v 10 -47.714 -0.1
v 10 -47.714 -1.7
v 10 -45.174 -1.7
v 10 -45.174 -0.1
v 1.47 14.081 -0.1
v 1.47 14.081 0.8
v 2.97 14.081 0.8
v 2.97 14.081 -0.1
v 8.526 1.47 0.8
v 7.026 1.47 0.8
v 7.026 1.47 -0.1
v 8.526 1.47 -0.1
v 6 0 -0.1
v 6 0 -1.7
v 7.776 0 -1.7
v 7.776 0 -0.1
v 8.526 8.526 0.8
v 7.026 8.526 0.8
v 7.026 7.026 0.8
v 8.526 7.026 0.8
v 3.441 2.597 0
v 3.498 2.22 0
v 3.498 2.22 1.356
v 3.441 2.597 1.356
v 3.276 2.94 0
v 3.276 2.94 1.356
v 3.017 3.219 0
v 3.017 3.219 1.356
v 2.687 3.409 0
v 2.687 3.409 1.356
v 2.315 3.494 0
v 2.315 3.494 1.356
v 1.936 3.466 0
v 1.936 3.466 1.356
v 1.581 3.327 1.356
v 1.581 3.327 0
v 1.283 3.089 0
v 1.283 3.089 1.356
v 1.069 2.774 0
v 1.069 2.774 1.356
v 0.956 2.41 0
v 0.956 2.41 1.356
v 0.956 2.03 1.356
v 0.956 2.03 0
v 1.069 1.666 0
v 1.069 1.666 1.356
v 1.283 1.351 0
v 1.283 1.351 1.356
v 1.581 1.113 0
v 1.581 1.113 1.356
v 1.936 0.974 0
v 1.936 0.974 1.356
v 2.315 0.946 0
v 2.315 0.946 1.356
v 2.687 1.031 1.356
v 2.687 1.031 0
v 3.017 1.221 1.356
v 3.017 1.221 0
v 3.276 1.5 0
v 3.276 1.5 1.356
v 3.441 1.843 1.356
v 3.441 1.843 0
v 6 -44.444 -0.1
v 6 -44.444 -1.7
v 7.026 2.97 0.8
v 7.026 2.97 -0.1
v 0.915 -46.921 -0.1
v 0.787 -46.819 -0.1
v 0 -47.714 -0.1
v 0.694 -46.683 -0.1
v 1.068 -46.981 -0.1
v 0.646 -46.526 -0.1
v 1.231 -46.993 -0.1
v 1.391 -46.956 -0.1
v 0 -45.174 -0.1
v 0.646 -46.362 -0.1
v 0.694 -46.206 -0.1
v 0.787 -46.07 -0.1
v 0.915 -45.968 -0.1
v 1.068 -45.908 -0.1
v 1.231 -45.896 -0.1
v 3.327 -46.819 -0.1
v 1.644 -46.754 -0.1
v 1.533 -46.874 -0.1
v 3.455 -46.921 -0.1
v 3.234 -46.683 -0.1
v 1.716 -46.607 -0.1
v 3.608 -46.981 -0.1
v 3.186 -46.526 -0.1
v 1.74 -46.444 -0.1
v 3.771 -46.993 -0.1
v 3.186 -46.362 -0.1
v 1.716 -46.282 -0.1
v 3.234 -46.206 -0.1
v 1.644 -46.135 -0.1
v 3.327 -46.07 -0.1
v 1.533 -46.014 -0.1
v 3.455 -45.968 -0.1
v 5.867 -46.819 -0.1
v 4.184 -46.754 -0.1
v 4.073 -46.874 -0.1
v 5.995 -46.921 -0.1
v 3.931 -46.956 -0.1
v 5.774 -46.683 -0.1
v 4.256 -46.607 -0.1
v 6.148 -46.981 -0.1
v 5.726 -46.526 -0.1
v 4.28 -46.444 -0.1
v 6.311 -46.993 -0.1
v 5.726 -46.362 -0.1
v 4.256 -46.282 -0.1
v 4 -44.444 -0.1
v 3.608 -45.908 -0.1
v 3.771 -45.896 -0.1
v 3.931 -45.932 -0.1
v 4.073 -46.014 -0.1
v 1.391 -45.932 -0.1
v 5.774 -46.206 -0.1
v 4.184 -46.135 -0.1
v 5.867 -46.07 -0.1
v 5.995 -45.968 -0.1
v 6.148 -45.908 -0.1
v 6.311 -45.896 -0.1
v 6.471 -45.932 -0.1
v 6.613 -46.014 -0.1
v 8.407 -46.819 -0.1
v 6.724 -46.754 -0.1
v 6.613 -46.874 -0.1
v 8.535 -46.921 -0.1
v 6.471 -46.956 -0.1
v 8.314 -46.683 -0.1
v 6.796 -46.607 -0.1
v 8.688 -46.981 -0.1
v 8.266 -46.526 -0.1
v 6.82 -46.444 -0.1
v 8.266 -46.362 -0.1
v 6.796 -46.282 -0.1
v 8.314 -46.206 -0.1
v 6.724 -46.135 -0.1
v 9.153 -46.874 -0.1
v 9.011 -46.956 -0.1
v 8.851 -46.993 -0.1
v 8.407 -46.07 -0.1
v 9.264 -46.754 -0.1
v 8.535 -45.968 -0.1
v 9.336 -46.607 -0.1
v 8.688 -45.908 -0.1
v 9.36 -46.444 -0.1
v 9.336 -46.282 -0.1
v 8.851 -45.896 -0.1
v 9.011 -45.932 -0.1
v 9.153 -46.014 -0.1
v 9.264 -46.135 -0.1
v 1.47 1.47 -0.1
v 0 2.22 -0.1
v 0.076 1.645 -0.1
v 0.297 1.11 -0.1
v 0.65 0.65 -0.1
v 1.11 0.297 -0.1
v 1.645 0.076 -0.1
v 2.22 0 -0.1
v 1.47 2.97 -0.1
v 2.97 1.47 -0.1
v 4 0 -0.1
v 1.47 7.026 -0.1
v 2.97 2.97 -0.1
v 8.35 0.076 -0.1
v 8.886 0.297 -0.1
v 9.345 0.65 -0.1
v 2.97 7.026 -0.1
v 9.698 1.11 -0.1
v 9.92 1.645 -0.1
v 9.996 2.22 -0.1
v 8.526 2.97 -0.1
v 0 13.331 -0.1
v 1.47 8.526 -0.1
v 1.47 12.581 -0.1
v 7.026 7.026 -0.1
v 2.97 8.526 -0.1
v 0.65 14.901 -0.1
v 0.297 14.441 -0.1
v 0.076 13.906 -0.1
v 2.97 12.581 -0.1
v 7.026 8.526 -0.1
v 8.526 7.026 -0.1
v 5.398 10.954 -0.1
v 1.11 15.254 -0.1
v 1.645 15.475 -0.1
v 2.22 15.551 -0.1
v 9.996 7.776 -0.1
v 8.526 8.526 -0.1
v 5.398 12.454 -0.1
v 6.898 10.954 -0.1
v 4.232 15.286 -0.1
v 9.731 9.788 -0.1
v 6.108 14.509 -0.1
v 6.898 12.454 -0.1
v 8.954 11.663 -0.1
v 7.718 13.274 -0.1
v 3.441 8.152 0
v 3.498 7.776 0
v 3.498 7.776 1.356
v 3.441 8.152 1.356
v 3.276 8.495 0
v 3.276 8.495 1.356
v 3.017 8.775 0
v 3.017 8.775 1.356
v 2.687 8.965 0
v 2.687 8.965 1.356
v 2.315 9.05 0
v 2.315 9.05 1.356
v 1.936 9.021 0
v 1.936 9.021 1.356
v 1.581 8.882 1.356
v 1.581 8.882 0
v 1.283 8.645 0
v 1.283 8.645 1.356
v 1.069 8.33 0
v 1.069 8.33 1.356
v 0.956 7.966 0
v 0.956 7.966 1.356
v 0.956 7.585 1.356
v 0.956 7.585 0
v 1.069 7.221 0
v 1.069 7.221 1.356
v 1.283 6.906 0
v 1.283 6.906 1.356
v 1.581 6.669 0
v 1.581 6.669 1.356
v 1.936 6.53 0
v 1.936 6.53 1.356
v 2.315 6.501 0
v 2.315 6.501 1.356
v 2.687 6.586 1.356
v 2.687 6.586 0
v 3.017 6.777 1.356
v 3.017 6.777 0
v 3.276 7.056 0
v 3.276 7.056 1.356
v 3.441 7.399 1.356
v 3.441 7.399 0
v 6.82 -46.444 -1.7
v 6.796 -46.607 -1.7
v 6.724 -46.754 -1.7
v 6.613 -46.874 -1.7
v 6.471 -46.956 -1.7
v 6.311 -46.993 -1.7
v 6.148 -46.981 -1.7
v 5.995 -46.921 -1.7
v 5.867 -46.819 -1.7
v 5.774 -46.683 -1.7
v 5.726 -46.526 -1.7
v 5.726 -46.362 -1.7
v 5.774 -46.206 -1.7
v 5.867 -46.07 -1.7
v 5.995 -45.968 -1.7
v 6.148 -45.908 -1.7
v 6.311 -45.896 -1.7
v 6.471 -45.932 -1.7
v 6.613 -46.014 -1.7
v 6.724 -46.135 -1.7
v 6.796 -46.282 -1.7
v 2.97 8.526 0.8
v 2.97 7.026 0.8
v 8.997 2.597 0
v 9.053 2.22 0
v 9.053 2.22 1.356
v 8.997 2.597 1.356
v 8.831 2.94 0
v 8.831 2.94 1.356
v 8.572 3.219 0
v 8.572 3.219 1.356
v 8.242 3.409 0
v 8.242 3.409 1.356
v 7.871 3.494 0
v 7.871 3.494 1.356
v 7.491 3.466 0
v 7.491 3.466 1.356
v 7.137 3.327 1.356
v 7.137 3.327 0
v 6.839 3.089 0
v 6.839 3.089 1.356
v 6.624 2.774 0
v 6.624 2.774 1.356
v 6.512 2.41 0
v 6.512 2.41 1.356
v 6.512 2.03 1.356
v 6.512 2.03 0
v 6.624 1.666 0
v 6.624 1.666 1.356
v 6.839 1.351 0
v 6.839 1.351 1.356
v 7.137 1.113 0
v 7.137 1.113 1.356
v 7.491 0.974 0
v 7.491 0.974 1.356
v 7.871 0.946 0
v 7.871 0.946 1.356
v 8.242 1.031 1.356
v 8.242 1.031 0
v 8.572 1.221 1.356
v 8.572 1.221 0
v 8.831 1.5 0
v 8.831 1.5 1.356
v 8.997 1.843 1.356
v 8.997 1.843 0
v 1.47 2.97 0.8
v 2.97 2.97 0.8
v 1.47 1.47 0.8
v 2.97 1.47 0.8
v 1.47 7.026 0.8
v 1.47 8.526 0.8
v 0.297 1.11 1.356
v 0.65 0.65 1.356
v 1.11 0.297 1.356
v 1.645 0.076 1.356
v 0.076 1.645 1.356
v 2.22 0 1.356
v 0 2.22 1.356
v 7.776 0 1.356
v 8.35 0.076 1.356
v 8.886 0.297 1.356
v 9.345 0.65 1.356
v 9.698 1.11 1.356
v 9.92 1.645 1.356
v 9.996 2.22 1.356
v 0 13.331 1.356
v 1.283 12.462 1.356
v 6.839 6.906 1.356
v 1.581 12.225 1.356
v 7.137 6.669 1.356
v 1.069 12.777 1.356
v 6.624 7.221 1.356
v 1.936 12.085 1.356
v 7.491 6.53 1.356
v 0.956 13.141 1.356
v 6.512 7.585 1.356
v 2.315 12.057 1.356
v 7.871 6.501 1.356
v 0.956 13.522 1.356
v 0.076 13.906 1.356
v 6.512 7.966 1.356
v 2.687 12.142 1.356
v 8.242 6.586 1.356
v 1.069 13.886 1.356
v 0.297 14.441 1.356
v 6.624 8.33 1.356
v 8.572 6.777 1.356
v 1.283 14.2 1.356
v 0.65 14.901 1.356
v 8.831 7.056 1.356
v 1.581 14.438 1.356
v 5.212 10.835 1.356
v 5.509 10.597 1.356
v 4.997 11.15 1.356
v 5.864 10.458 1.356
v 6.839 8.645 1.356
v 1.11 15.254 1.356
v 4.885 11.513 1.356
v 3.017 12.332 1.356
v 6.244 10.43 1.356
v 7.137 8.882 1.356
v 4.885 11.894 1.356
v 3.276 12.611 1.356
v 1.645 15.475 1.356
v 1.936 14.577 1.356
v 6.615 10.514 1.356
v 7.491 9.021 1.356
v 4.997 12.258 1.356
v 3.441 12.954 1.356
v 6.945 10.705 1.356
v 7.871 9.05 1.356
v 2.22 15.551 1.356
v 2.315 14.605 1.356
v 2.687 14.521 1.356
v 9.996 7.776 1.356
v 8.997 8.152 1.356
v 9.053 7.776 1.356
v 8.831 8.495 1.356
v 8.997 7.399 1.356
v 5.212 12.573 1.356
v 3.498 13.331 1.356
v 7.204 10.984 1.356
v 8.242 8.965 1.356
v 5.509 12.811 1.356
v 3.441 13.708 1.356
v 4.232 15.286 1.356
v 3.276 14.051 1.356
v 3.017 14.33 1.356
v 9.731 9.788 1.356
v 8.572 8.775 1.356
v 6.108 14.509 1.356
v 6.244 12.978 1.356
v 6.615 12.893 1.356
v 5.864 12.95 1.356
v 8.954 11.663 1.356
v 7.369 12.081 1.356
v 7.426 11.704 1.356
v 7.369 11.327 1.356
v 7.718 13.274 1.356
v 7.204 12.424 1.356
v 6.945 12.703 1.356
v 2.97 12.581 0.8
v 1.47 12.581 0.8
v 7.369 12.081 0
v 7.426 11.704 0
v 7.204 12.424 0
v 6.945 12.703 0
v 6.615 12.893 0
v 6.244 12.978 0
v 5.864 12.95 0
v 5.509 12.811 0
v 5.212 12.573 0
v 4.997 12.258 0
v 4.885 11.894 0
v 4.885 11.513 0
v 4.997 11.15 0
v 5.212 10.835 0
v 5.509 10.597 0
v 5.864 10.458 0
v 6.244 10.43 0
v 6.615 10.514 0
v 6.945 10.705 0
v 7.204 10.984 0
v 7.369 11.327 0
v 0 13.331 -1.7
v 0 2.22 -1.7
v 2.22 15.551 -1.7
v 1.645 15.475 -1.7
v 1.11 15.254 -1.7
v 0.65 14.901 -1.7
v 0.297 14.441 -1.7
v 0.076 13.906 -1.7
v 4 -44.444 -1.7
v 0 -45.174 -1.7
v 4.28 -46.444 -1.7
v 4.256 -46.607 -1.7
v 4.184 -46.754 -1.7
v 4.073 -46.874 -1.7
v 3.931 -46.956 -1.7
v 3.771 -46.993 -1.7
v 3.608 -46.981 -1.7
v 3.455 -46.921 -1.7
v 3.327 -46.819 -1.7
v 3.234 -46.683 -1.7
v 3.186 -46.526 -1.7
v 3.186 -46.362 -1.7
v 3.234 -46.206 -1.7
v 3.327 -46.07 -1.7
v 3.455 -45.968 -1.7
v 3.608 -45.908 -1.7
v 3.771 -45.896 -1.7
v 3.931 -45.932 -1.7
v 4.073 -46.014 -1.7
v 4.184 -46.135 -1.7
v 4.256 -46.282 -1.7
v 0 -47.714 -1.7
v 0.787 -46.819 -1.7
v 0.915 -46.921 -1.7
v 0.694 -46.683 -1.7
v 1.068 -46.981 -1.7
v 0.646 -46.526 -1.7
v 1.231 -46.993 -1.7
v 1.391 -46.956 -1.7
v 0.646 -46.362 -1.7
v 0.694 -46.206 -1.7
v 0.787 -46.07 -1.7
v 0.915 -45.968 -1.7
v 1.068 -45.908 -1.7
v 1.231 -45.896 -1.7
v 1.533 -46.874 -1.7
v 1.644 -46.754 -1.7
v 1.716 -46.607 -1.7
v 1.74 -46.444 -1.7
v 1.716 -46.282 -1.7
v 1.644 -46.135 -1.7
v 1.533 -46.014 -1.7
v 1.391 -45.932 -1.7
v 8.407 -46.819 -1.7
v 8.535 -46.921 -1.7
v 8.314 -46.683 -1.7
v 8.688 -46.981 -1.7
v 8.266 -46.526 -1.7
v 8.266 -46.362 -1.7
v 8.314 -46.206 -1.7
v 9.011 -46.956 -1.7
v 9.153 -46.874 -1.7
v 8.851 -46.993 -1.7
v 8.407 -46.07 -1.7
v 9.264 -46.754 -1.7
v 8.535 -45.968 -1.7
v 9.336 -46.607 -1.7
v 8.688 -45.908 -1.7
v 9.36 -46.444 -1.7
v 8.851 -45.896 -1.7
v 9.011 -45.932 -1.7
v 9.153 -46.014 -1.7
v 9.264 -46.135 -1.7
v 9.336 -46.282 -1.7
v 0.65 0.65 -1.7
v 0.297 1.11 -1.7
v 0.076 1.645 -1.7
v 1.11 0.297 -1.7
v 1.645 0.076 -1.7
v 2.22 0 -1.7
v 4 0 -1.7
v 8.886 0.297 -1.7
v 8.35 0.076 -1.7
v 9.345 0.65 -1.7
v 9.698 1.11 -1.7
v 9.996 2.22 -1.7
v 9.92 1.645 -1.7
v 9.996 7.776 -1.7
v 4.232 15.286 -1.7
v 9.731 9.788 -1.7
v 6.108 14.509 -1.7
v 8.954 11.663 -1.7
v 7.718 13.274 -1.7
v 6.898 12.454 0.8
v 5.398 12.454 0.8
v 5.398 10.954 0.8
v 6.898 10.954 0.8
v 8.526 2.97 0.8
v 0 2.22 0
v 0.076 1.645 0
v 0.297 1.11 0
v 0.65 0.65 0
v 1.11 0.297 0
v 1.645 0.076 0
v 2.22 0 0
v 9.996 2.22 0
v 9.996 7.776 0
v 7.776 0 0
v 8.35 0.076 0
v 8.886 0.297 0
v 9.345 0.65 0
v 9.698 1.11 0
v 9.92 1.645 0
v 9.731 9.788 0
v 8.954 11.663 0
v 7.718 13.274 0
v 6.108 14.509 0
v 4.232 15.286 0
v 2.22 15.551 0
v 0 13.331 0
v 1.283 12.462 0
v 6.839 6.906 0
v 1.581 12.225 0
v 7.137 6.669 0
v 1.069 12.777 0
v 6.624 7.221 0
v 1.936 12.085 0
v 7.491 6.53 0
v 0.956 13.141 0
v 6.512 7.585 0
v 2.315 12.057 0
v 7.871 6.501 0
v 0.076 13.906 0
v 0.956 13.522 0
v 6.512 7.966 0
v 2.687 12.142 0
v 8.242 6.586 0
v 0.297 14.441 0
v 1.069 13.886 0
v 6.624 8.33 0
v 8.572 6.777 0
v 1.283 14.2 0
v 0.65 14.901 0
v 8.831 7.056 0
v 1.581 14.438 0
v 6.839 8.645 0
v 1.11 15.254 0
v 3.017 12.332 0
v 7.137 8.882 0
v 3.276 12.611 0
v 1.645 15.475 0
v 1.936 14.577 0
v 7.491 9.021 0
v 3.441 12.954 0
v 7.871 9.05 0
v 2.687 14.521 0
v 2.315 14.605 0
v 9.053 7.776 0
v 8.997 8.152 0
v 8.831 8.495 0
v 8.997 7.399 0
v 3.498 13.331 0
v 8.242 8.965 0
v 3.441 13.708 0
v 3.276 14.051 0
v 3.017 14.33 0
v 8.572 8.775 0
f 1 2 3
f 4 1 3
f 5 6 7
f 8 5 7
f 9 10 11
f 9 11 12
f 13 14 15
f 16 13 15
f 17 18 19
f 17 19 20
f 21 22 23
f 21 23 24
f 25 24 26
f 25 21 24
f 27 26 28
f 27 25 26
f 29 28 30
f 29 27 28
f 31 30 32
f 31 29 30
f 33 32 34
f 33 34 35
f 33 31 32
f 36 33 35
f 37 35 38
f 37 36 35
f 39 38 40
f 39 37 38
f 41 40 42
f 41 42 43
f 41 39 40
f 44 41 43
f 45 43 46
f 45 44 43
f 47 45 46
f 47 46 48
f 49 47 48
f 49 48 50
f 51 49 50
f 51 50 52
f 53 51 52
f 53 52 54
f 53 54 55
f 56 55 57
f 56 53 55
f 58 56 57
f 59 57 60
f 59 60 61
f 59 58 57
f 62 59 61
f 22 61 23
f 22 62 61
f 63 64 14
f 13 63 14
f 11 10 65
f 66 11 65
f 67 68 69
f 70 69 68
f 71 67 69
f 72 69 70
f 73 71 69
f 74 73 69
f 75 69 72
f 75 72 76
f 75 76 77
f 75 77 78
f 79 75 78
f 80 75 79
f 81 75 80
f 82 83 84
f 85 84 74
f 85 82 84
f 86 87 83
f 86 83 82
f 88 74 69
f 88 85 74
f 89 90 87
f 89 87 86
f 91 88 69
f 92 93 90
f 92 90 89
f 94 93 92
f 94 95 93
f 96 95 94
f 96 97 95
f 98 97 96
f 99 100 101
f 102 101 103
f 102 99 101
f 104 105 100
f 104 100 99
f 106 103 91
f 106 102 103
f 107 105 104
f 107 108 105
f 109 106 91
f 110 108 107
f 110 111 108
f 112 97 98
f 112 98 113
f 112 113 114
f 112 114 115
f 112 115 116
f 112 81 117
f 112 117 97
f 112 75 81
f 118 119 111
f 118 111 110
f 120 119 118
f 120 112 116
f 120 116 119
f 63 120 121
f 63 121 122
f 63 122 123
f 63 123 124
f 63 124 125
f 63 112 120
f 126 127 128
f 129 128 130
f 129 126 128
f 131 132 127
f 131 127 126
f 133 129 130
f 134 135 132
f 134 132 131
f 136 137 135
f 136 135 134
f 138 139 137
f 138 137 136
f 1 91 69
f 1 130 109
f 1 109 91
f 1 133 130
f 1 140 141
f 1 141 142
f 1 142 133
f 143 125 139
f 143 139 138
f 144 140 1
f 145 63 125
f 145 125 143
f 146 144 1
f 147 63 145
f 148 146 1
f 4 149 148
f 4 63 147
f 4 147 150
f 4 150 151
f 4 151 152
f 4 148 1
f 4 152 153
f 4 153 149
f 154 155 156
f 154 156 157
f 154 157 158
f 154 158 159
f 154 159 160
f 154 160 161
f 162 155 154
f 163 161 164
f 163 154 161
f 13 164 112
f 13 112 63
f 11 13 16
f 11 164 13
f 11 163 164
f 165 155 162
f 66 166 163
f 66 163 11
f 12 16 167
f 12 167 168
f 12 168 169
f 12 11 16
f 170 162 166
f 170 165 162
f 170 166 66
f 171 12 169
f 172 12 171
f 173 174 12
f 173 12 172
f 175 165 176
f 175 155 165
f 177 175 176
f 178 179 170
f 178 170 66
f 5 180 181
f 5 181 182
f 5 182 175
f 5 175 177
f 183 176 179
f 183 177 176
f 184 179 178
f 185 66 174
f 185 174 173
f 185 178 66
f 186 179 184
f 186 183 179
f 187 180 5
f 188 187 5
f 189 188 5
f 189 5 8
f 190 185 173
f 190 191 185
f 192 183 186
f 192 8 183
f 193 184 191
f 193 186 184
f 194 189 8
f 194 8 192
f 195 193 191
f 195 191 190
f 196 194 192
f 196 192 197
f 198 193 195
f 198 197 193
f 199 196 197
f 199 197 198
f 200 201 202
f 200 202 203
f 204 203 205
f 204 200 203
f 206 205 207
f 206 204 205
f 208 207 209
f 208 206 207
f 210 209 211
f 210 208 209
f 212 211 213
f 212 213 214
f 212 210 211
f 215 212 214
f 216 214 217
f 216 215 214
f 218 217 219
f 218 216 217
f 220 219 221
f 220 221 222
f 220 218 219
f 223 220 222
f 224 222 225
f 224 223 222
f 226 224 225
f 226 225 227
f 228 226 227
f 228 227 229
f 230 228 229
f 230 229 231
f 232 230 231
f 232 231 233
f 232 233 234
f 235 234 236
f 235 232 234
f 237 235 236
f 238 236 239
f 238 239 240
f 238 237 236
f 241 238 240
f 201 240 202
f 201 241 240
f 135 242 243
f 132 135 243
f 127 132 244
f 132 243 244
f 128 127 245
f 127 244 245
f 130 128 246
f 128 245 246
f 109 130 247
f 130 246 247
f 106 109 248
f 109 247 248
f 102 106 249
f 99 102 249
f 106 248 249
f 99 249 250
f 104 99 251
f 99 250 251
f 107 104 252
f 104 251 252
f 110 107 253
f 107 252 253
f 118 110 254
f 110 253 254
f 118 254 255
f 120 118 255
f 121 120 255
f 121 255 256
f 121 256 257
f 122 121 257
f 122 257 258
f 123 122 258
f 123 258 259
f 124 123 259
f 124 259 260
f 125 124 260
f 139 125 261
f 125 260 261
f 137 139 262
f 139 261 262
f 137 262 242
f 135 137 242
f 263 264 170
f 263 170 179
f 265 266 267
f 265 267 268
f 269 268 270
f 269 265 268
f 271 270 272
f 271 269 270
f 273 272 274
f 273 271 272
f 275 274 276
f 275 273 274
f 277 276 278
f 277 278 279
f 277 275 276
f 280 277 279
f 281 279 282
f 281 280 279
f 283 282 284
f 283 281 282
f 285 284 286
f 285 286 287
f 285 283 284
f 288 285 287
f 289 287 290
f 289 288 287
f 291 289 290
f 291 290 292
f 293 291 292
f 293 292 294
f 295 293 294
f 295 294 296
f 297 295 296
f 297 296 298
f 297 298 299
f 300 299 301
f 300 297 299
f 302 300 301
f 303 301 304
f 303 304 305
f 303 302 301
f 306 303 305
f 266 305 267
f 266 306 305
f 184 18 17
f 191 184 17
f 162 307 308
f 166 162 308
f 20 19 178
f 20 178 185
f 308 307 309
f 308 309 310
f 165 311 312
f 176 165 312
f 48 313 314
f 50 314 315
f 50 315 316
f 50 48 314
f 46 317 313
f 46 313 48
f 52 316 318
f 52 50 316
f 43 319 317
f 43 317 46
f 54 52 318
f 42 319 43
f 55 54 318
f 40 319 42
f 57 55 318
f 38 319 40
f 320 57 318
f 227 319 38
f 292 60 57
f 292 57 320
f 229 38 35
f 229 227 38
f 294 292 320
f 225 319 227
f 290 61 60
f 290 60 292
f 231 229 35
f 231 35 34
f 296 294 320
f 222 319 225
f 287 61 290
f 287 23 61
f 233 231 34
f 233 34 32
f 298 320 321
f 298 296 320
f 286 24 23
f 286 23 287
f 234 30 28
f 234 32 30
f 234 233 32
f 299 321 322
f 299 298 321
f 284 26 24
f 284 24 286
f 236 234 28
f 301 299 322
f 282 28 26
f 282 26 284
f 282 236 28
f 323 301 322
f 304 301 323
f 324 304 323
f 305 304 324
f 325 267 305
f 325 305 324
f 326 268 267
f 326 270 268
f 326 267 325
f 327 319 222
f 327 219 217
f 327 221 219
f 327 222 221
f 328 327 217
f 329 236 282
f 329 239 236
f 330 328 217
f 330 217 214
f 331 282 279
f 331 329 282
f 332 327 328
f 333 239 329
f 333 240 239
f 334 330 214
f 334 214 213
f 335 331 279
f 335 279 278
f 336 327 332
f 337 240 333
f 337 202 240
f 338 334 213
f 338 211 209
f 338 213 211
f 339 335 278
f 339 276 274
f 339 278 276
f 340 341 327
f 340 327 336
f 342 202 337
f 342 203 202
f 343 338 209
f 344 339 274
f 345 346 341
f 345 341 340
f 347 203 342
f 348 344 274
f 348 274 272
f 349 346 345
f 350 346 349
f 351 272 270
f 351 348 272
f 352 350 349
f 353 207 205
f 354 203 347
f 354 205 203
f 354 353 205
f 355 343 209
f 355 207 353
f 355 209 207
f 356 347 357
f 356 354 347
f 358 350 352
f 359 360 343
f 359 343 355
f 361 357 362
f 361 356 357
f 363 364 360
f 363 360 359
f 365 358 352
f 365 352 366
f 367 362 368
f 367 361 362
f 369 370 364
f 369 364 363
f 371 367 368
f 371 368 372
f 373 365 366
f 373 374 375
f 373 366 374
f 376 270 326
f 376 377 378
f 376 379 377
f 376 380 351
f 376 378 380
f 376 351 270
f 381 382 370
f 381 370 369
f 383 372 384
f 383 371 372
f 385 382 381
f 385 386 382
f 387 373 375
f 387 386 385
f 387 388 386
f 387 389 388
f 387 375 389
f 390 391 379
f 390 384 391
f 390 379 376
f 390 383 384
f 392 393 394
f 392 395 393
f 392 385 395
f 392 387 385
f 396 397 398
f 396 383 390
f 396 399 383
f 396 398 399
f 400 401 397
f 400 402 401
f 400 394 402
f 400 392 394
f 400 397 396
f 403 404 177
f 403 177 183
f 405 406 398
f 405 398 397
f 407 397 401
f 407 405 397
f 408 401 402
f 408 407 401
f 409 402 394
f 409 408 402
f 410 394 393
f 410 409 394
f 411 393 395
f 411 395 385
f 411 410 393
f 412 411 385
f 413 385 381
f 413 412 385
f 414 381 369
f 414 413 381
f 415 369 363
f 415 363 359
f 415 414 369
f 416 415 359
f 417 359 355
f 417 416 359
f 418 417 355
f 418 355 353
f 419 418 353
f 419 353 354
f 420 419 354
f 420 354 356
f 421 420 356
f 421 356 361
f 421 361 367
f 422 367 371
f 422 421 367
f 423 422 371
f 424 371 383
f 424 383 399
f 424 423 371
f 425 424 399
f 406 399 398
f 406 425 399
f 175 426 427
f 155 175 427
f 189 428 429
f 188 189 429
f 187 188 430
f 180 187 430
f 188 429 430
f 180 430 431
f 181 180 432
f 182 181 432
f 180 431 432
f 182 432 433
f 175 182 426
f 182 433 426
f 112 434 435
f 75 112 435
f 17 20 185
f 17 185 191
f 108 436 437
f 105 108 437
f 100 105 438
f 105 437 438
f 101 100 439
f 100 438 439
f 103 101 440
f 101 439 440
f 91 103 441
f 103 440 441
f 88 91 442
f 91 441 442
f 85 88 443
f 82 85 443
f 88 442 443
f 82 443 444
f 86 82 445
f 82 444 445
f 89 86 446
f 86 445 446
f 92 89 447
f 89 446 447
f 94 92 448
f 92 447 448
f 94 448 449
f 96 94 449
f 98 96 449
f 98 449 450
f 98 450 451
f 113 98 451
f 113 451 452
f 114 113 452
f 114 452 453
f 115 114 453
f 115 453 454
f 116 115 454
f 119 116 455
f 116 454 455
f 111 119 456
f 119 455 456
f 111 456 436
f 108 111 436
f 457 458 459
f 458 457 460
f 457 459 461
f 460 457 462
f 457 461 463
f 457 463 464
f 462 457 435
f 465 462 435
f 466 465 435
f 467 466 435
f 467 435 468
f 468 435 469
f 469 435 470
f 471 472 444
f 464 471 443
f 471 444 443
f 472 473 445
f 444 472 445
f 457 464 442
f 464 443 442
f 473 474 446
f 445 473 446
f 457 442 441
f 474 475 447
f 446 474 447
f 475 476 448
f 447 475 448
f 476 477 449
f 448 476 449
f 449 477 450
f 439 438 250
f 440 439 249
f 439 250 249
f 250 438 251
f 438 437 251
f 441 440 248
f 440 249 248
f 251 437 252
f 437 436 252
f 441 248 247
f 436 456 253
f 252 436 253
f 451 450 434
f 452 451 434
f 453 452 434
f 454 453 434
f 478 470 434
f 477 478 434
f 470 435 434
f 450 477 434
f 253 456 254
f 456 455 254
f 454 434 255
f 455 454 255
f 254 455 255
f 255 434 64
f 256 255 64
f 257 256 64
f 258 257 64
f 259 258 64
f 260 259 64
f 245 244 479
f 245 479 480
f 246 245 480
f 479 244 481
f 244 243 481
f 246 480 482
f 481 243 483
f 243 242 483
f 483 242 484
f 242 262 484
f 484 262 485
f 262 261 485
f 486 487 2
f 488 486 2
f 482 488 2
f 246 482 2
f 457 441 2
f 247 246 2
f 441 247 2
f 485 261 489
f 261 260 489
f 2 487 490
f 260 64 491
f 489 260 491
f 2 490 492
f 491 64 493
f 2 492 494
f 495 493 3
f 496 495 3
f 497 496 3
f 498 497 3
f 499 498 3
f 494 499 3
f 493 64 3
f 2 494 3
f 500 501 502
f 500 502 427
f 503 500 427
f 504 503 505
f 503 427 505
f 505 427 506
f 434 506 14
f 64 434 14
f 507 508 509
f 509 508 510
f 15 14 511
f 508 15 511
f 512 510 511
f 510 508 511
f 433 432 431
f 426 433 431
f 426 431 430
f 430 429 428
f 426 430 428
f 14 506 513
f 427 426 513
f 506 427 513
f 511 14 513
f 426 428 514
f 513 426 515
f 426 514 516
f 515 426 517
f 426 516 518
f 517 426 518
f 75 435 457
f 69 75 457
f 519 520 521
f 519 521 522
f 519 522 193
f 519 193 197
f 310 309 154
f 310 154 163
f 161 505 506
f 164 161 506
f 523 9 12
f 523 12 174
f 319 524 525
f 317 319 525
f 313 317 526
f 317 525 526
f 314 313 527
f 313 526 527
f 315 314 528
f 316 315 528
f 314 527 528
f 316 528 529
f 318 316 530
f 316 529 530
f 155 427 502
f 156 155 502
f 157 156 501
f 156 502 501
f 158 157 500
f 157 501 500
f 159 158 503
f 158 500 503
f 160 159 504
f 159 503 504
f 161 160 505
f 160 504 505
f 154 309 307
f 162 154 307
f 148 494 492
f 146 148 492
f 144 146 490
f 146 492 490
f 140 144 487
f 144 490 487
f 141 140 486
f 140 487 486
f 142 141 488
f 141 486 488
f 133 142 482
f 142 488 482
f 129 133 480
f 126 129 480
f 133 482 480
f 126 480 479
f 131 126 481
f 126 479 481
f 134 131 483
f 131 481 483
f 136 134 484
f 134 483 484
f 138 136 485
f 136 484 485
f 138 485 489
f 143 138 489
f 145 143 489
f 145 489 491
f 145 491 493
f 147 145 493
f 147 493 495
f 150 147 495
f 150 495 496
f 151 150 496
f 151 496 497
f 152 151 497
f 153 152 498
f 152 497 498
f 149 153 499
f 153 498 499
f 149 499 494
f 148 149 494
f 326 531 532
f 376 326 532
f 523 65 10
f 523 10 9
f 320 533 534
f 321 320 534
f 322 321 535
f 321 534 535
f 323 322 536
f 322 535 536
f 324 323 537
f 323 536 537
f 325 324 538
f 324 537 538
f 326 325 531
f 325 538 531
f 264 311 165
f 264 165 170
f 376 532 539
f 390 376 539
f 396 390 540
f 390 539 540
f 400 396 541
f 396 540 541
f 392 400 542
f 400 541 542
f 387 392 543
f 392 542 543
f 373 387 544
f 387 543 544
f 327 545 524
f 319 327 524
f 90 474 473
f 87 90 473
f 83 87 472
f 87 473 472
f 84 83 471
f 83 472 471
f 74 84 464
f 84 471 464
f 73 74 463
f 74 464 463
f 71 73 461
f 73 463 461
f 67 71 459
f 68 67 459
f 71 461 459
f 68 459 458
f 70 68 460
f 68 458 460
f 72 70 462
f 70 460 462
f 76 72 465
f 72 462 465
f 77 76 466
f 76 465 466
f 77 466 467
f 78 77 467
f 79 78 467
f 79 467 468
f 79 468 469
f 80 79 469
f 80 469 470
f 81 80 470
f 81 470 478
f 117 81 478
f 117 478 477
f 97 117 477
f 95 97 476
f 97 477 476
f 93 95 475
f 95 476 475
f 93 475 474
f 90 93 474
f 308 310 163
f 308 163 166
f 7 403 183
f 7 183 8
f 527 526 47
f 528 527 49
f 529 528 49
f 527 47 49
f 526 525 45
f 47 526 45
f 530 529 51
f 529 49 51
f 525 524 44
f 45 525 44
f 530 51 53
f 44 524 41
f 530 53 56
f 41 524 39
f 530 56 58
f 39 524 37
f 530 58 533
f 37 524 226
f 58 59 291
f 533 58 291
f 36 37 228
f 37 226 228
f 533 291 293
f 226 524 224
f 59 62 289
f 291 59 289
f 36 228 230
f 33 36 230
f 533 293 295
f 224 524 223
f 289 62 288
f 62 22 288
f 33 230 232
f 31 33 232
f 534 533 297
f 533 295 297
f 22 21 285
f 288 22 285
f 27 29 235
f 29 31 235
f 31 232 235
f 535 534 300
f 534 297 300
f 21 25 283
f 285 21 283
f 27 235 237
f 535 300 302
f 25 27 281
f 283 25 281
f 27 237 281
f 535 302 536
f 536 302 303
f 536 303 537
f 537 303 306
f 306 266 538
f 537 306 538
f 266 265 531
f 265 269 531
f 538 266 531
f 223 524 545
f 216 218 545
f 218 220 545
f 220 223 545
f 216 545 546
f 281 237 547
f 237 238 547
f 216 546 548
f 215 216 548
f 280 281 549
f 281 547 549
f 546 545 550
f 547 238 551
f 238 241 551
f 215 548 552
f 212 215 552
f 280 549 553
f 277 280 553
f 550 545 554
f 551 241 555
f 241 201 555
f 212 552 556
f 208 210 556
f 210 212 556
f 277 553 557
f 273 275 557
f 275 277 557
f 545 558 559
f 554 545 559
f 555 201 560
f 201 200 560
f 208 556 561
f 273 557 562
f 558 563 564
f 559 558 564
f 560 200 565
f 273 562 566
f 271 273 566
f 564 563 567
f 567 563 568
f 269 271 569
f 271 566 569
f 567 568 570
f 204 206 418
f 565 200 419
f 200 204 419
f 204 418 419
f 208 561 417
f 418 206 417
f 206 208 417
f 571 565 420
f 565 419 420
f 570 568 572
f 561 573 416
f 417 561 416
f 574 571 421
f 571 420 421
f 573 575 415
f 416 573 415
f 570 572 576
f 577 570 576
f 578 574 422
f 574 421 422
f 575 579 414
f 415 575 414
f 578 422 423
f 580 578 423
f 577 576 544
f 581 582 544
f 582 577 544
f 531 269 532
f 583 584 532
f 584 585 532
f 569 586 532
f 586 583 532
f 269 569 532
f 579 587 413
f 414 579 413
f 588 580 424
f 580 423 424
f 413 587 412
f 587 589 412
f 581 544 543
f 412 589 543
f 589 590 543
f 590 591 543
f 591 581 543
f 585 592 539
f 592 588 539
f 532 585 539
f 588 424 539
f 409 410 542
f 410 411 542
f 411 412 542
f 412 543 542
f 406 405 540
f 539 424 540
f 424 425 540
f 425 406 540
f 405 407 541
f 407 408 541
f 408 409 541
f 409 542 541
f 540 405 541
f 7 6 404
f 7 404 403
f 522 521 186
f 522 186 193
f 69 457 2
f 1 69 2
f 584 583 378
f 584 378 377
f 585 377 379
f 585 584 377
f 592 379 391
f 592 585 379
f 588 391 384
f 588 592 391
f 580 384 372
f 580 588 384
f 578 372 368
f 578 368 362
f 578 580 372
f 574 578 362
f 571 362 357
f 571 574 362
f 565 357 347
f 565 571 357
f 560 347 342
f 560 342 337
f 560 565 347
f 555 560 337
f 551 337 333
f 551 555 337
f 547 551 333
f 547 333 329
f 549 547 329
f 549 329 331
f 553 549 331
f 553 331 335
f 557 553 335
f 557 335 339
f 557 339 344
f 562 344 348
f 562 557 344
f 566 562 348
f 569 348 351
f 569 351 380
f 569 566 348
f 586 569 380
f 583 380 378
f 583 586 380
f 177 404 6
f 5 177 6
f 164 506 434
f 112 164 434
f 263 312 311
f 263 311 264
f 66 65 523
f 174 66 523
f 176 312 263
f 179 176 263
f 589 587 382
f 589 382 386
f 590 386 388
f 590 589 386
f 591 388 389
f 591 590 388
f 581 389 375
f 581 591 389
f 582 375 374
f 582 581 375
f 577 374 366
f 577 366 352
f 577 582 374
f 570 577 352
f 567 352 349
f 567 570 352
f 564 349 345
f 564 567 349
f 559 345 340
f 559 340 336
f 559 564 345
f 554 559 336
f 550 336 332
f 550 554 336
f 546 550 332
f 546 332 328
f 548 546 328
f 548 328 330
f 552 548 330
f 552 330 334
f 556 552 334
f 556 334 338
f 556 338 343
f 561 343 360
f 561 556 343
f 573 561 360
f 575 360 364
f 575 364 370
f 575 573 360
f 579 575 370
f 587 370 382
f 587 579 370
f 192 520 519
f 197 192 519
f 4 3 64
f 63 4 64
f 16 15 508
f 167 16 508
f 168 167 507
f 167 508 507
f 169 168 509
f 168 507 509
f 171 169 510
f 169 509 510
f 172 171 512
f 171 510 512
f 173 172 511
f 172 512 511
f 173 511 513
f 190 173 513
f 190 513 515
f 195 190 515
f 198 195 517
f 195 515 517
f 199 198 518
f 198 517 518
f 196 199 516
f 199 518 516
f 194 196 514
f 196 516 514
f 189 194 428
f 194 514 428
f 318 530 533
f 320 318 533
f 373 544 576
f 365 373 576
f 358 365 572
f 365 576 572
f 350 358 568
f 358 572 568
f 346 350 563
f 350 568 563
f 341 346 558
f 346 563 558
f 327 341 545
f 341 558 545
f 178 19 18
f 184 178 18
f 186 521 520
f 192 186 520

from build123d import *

# Parameters (mm, degrees)
SKETCH_R          = 1.277778
PAD_DEPTH         = 1.355556
SKETCH001_W       = 1.5
SKETCH001_H       = 1.5
PAD001_DEPTH      = 0.8
PAD001_DEPTH_BACK = 1.6
PAD002_DEPTH      = 1.6
SKETCH003_R       = 0.55
PAD003_DEPTH      = 1.6


with BuildPart() as part:
    # Sketch (on XY_Plane of Origin) → Pad (new body)
    with BuildSketch(Plane.XY):
        with BuildLine():
            ThreePointArc((2.22, 15.551111), (0.650223, 14.900888), (0, 13.331111))
            Line((0, 13.331111), (0, 2.219999))
            ThreePointArc((0, 2.219999), (0.650223, 0.650223), (2.22, 0))
            Line((2.22, 0), (7.775544, 0))
            ThreePointArc((7.775544, 0), (9.345329, 0.650219), (9.995556, 2.22))
            Line((9.995556, 2.22), (9.995556, 7.775556))
            ThreePointArc((9.995556, 7.775556), (7.718148, 13.273704), (2.22, 15.551111))
        make_face()
        with Locations((2.22, 13.331111)):
            Circle(SKETCH_R, mode=Mode.SUBTRACT)
        with Locations((2.22, 7.775556)):
            Circle(SKETCH_R, mode=Mode.SUBTRACT)
        with Locations((2.22, 2.22)):
            Circle(SKETCH_R, mode=Mode.SUBTRACT)
        with Locations((7.775556, 7.775556)):
            Circle(SKETCH_R, mode=Mode.SUBTRACT)
        with Locations((7.775556, 2.22)):
            Circle(SKETCH_R, mode=Mode.SUBTRACT)
        with Locations((6.148371, 11.703927)):
            Circle(SKETCH_R, mode=Mode.SUBTRACT)
    extrude(amount=PAD_DEPTH)

    # Sketch001 (on XY_Plane of Origin) → Pad001 (join, two sides)
    with BuildSketch(Plane.XY) as pad001_sk:
        with Locations((2.22, 13.331111)):
            Rectangle(SKETCH001_W, SKETCH001_H)
        with Locations((7.775556, 7.775556)):
            Rectangle(SKETCH001_W, SKETCH001_H)
        with Locations((2.22, 7.775556)):
            Rectangle(SKETCH001_W, SKETCH001_H)
        with Locations((2.22, 2.22)):
            Rectangle(SKETCH001_W, SKETCH001_H)
        with Locations((7.775556, 2.22)):
            Rectangle(SKETCH001_W, SKETCH001_H)
        with Locations((6.148371, 11.703927)):
            Rectangle(SKETCH001_W, SKETCH001_H)
    extrude(amount=PAD001_DEPTH)
    extrude(pad001_sk.sketch, amount=-PAD001_DEPTH_BACK)

    # Sketch002 (on XY_Plane of Origin) → Pad002 (join)
    with BuildSketch(Plane.XY.offset(-1.7)):
        with BuildLine():
            ThreePointArc((2.22, 15.551111), (0.650223, 14.900888), (0, 13.331111))
            Line((0, 13.331111), (0, 2.219999))
            ThreePointArc((0, 2.219999), (0.650223, 0.650223), (2.22, 0))
            Line((2.22, 0), (7.775544, 0))
            ThreePointArc((7.775544, 0), (9.345329, 0.650219), (9.995556, 2.22))
            Line((9.995556, 2.22), (9.995556, 7.775556))
            ThreePointArc((9.995556, 7.775556), (7.718148, 13.273704), (2.22, 15.551111))
        make_face()
    extrude(amount=PAD002_DEPTH)

    # Sketch003 (on Face34 of Pad002) → Pad003 (join)
    with BuildSketch(Plane(origin=(0, 0, -1.7), x_dir=(1, 0, 0), z_dir=(0, 0, -1))):
        Polygon((0, 45.174444), (0, 47.714444), (10, 47.714444), (10, 45.174444), (6, 44.444444), (6, 0), (4, 0), (4, 44.444444), align=None)
        with Locations((1.19, 46.444444)):
            Circle(SKETCH003_R, mode=Mode.SUBTRACT)
        with Locations((3.73, 46.444444)):
            Circle(SKETCH003_R, mode=Mode.SUBTRACT)
        with Locations((6.27, 46.444444)):
            Circle(SKETCH003_R, mode=Mode.SUBTRACT)
        with Locations((8.81, 46.444444)):
            Circle(SKETCH003_R, mode=Mode.SUBTRACT)
    extrude(amount=-PAD003_DEPTH)


solid = part.part
